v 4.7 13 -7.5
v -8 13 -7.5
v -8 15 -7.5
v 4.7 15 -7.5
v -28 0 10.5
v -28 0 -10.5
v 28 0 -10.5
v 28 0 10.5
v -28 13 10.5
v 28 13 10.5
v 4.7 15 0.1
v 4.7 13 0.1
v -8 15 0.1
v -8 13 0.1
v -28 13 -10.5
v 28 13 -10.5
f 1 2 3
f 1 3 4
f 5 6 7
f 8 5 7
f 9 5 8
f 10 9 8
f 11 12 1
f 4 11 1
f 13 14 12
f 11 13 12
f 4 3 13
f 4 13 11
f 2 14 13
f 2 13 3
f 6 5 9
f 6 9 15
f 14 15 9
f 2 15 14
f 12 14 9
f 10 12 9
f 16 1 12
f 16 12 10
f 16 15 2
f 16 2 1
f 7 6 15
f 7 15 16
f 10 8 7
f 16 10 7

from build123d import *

# Parameters (mm, degrees)
SK_P01_F2INLINEHOLDER5A_W        = 56
SK_P01_F2INLINEHOLDER5A_H        = 21
P01_F2INLINEHOLDER5A_DEPTH       = 13
P02_D1IDEALDIODEPOLOLU5382_START = 13
SK_P02_D1IDEALDIODEPOLOLU5382_W  = 12.7
SK_P02_D1IDEALDIODEPOLOLU5382_H  = 7.6
P02_D1IDEALDIODEPOLOLU5382_DEPTH = 2


with BuildPart() as part:
    # SK_P01_F2inlineholder5A → P01_F2inlineholder5A (new body)
    with BuildSketch(Plane(origin=(0, 0, 0), x_dir=(1, 0, 0), z_dir=(0, 1, 0))):
        Rectangle(SK_P01_F2INLINEHOLDER5A_W, SK_P01_F2INLINEHOLDER5A_H)
    extrude(amount=P01_F2INLINEHOLDER5A_DEPTH)

    # SK_P02_D1idealdiodePololu5382 → P02_D1idealdiodePololu5382 (add)
    with BuildSketch(Plane(origin=(0, 0, 0), x_dir=(1, 0, 0), z_dir=(0, 1, 0)).offset(P02_D1IDEALDIODEPOLOLU5382_START)):
        with Locations((-1.65, 3.7)):
            Rectangle(SK_P02_D1IDEALDIODEPOLOLU5382_W, SK_P02_D1IDEALDIODEPOLOLU5382_H)
    extrude(amount=P02_D1IDEALDIODEPOLOLU5382_DEPTH)


solid = part.part
